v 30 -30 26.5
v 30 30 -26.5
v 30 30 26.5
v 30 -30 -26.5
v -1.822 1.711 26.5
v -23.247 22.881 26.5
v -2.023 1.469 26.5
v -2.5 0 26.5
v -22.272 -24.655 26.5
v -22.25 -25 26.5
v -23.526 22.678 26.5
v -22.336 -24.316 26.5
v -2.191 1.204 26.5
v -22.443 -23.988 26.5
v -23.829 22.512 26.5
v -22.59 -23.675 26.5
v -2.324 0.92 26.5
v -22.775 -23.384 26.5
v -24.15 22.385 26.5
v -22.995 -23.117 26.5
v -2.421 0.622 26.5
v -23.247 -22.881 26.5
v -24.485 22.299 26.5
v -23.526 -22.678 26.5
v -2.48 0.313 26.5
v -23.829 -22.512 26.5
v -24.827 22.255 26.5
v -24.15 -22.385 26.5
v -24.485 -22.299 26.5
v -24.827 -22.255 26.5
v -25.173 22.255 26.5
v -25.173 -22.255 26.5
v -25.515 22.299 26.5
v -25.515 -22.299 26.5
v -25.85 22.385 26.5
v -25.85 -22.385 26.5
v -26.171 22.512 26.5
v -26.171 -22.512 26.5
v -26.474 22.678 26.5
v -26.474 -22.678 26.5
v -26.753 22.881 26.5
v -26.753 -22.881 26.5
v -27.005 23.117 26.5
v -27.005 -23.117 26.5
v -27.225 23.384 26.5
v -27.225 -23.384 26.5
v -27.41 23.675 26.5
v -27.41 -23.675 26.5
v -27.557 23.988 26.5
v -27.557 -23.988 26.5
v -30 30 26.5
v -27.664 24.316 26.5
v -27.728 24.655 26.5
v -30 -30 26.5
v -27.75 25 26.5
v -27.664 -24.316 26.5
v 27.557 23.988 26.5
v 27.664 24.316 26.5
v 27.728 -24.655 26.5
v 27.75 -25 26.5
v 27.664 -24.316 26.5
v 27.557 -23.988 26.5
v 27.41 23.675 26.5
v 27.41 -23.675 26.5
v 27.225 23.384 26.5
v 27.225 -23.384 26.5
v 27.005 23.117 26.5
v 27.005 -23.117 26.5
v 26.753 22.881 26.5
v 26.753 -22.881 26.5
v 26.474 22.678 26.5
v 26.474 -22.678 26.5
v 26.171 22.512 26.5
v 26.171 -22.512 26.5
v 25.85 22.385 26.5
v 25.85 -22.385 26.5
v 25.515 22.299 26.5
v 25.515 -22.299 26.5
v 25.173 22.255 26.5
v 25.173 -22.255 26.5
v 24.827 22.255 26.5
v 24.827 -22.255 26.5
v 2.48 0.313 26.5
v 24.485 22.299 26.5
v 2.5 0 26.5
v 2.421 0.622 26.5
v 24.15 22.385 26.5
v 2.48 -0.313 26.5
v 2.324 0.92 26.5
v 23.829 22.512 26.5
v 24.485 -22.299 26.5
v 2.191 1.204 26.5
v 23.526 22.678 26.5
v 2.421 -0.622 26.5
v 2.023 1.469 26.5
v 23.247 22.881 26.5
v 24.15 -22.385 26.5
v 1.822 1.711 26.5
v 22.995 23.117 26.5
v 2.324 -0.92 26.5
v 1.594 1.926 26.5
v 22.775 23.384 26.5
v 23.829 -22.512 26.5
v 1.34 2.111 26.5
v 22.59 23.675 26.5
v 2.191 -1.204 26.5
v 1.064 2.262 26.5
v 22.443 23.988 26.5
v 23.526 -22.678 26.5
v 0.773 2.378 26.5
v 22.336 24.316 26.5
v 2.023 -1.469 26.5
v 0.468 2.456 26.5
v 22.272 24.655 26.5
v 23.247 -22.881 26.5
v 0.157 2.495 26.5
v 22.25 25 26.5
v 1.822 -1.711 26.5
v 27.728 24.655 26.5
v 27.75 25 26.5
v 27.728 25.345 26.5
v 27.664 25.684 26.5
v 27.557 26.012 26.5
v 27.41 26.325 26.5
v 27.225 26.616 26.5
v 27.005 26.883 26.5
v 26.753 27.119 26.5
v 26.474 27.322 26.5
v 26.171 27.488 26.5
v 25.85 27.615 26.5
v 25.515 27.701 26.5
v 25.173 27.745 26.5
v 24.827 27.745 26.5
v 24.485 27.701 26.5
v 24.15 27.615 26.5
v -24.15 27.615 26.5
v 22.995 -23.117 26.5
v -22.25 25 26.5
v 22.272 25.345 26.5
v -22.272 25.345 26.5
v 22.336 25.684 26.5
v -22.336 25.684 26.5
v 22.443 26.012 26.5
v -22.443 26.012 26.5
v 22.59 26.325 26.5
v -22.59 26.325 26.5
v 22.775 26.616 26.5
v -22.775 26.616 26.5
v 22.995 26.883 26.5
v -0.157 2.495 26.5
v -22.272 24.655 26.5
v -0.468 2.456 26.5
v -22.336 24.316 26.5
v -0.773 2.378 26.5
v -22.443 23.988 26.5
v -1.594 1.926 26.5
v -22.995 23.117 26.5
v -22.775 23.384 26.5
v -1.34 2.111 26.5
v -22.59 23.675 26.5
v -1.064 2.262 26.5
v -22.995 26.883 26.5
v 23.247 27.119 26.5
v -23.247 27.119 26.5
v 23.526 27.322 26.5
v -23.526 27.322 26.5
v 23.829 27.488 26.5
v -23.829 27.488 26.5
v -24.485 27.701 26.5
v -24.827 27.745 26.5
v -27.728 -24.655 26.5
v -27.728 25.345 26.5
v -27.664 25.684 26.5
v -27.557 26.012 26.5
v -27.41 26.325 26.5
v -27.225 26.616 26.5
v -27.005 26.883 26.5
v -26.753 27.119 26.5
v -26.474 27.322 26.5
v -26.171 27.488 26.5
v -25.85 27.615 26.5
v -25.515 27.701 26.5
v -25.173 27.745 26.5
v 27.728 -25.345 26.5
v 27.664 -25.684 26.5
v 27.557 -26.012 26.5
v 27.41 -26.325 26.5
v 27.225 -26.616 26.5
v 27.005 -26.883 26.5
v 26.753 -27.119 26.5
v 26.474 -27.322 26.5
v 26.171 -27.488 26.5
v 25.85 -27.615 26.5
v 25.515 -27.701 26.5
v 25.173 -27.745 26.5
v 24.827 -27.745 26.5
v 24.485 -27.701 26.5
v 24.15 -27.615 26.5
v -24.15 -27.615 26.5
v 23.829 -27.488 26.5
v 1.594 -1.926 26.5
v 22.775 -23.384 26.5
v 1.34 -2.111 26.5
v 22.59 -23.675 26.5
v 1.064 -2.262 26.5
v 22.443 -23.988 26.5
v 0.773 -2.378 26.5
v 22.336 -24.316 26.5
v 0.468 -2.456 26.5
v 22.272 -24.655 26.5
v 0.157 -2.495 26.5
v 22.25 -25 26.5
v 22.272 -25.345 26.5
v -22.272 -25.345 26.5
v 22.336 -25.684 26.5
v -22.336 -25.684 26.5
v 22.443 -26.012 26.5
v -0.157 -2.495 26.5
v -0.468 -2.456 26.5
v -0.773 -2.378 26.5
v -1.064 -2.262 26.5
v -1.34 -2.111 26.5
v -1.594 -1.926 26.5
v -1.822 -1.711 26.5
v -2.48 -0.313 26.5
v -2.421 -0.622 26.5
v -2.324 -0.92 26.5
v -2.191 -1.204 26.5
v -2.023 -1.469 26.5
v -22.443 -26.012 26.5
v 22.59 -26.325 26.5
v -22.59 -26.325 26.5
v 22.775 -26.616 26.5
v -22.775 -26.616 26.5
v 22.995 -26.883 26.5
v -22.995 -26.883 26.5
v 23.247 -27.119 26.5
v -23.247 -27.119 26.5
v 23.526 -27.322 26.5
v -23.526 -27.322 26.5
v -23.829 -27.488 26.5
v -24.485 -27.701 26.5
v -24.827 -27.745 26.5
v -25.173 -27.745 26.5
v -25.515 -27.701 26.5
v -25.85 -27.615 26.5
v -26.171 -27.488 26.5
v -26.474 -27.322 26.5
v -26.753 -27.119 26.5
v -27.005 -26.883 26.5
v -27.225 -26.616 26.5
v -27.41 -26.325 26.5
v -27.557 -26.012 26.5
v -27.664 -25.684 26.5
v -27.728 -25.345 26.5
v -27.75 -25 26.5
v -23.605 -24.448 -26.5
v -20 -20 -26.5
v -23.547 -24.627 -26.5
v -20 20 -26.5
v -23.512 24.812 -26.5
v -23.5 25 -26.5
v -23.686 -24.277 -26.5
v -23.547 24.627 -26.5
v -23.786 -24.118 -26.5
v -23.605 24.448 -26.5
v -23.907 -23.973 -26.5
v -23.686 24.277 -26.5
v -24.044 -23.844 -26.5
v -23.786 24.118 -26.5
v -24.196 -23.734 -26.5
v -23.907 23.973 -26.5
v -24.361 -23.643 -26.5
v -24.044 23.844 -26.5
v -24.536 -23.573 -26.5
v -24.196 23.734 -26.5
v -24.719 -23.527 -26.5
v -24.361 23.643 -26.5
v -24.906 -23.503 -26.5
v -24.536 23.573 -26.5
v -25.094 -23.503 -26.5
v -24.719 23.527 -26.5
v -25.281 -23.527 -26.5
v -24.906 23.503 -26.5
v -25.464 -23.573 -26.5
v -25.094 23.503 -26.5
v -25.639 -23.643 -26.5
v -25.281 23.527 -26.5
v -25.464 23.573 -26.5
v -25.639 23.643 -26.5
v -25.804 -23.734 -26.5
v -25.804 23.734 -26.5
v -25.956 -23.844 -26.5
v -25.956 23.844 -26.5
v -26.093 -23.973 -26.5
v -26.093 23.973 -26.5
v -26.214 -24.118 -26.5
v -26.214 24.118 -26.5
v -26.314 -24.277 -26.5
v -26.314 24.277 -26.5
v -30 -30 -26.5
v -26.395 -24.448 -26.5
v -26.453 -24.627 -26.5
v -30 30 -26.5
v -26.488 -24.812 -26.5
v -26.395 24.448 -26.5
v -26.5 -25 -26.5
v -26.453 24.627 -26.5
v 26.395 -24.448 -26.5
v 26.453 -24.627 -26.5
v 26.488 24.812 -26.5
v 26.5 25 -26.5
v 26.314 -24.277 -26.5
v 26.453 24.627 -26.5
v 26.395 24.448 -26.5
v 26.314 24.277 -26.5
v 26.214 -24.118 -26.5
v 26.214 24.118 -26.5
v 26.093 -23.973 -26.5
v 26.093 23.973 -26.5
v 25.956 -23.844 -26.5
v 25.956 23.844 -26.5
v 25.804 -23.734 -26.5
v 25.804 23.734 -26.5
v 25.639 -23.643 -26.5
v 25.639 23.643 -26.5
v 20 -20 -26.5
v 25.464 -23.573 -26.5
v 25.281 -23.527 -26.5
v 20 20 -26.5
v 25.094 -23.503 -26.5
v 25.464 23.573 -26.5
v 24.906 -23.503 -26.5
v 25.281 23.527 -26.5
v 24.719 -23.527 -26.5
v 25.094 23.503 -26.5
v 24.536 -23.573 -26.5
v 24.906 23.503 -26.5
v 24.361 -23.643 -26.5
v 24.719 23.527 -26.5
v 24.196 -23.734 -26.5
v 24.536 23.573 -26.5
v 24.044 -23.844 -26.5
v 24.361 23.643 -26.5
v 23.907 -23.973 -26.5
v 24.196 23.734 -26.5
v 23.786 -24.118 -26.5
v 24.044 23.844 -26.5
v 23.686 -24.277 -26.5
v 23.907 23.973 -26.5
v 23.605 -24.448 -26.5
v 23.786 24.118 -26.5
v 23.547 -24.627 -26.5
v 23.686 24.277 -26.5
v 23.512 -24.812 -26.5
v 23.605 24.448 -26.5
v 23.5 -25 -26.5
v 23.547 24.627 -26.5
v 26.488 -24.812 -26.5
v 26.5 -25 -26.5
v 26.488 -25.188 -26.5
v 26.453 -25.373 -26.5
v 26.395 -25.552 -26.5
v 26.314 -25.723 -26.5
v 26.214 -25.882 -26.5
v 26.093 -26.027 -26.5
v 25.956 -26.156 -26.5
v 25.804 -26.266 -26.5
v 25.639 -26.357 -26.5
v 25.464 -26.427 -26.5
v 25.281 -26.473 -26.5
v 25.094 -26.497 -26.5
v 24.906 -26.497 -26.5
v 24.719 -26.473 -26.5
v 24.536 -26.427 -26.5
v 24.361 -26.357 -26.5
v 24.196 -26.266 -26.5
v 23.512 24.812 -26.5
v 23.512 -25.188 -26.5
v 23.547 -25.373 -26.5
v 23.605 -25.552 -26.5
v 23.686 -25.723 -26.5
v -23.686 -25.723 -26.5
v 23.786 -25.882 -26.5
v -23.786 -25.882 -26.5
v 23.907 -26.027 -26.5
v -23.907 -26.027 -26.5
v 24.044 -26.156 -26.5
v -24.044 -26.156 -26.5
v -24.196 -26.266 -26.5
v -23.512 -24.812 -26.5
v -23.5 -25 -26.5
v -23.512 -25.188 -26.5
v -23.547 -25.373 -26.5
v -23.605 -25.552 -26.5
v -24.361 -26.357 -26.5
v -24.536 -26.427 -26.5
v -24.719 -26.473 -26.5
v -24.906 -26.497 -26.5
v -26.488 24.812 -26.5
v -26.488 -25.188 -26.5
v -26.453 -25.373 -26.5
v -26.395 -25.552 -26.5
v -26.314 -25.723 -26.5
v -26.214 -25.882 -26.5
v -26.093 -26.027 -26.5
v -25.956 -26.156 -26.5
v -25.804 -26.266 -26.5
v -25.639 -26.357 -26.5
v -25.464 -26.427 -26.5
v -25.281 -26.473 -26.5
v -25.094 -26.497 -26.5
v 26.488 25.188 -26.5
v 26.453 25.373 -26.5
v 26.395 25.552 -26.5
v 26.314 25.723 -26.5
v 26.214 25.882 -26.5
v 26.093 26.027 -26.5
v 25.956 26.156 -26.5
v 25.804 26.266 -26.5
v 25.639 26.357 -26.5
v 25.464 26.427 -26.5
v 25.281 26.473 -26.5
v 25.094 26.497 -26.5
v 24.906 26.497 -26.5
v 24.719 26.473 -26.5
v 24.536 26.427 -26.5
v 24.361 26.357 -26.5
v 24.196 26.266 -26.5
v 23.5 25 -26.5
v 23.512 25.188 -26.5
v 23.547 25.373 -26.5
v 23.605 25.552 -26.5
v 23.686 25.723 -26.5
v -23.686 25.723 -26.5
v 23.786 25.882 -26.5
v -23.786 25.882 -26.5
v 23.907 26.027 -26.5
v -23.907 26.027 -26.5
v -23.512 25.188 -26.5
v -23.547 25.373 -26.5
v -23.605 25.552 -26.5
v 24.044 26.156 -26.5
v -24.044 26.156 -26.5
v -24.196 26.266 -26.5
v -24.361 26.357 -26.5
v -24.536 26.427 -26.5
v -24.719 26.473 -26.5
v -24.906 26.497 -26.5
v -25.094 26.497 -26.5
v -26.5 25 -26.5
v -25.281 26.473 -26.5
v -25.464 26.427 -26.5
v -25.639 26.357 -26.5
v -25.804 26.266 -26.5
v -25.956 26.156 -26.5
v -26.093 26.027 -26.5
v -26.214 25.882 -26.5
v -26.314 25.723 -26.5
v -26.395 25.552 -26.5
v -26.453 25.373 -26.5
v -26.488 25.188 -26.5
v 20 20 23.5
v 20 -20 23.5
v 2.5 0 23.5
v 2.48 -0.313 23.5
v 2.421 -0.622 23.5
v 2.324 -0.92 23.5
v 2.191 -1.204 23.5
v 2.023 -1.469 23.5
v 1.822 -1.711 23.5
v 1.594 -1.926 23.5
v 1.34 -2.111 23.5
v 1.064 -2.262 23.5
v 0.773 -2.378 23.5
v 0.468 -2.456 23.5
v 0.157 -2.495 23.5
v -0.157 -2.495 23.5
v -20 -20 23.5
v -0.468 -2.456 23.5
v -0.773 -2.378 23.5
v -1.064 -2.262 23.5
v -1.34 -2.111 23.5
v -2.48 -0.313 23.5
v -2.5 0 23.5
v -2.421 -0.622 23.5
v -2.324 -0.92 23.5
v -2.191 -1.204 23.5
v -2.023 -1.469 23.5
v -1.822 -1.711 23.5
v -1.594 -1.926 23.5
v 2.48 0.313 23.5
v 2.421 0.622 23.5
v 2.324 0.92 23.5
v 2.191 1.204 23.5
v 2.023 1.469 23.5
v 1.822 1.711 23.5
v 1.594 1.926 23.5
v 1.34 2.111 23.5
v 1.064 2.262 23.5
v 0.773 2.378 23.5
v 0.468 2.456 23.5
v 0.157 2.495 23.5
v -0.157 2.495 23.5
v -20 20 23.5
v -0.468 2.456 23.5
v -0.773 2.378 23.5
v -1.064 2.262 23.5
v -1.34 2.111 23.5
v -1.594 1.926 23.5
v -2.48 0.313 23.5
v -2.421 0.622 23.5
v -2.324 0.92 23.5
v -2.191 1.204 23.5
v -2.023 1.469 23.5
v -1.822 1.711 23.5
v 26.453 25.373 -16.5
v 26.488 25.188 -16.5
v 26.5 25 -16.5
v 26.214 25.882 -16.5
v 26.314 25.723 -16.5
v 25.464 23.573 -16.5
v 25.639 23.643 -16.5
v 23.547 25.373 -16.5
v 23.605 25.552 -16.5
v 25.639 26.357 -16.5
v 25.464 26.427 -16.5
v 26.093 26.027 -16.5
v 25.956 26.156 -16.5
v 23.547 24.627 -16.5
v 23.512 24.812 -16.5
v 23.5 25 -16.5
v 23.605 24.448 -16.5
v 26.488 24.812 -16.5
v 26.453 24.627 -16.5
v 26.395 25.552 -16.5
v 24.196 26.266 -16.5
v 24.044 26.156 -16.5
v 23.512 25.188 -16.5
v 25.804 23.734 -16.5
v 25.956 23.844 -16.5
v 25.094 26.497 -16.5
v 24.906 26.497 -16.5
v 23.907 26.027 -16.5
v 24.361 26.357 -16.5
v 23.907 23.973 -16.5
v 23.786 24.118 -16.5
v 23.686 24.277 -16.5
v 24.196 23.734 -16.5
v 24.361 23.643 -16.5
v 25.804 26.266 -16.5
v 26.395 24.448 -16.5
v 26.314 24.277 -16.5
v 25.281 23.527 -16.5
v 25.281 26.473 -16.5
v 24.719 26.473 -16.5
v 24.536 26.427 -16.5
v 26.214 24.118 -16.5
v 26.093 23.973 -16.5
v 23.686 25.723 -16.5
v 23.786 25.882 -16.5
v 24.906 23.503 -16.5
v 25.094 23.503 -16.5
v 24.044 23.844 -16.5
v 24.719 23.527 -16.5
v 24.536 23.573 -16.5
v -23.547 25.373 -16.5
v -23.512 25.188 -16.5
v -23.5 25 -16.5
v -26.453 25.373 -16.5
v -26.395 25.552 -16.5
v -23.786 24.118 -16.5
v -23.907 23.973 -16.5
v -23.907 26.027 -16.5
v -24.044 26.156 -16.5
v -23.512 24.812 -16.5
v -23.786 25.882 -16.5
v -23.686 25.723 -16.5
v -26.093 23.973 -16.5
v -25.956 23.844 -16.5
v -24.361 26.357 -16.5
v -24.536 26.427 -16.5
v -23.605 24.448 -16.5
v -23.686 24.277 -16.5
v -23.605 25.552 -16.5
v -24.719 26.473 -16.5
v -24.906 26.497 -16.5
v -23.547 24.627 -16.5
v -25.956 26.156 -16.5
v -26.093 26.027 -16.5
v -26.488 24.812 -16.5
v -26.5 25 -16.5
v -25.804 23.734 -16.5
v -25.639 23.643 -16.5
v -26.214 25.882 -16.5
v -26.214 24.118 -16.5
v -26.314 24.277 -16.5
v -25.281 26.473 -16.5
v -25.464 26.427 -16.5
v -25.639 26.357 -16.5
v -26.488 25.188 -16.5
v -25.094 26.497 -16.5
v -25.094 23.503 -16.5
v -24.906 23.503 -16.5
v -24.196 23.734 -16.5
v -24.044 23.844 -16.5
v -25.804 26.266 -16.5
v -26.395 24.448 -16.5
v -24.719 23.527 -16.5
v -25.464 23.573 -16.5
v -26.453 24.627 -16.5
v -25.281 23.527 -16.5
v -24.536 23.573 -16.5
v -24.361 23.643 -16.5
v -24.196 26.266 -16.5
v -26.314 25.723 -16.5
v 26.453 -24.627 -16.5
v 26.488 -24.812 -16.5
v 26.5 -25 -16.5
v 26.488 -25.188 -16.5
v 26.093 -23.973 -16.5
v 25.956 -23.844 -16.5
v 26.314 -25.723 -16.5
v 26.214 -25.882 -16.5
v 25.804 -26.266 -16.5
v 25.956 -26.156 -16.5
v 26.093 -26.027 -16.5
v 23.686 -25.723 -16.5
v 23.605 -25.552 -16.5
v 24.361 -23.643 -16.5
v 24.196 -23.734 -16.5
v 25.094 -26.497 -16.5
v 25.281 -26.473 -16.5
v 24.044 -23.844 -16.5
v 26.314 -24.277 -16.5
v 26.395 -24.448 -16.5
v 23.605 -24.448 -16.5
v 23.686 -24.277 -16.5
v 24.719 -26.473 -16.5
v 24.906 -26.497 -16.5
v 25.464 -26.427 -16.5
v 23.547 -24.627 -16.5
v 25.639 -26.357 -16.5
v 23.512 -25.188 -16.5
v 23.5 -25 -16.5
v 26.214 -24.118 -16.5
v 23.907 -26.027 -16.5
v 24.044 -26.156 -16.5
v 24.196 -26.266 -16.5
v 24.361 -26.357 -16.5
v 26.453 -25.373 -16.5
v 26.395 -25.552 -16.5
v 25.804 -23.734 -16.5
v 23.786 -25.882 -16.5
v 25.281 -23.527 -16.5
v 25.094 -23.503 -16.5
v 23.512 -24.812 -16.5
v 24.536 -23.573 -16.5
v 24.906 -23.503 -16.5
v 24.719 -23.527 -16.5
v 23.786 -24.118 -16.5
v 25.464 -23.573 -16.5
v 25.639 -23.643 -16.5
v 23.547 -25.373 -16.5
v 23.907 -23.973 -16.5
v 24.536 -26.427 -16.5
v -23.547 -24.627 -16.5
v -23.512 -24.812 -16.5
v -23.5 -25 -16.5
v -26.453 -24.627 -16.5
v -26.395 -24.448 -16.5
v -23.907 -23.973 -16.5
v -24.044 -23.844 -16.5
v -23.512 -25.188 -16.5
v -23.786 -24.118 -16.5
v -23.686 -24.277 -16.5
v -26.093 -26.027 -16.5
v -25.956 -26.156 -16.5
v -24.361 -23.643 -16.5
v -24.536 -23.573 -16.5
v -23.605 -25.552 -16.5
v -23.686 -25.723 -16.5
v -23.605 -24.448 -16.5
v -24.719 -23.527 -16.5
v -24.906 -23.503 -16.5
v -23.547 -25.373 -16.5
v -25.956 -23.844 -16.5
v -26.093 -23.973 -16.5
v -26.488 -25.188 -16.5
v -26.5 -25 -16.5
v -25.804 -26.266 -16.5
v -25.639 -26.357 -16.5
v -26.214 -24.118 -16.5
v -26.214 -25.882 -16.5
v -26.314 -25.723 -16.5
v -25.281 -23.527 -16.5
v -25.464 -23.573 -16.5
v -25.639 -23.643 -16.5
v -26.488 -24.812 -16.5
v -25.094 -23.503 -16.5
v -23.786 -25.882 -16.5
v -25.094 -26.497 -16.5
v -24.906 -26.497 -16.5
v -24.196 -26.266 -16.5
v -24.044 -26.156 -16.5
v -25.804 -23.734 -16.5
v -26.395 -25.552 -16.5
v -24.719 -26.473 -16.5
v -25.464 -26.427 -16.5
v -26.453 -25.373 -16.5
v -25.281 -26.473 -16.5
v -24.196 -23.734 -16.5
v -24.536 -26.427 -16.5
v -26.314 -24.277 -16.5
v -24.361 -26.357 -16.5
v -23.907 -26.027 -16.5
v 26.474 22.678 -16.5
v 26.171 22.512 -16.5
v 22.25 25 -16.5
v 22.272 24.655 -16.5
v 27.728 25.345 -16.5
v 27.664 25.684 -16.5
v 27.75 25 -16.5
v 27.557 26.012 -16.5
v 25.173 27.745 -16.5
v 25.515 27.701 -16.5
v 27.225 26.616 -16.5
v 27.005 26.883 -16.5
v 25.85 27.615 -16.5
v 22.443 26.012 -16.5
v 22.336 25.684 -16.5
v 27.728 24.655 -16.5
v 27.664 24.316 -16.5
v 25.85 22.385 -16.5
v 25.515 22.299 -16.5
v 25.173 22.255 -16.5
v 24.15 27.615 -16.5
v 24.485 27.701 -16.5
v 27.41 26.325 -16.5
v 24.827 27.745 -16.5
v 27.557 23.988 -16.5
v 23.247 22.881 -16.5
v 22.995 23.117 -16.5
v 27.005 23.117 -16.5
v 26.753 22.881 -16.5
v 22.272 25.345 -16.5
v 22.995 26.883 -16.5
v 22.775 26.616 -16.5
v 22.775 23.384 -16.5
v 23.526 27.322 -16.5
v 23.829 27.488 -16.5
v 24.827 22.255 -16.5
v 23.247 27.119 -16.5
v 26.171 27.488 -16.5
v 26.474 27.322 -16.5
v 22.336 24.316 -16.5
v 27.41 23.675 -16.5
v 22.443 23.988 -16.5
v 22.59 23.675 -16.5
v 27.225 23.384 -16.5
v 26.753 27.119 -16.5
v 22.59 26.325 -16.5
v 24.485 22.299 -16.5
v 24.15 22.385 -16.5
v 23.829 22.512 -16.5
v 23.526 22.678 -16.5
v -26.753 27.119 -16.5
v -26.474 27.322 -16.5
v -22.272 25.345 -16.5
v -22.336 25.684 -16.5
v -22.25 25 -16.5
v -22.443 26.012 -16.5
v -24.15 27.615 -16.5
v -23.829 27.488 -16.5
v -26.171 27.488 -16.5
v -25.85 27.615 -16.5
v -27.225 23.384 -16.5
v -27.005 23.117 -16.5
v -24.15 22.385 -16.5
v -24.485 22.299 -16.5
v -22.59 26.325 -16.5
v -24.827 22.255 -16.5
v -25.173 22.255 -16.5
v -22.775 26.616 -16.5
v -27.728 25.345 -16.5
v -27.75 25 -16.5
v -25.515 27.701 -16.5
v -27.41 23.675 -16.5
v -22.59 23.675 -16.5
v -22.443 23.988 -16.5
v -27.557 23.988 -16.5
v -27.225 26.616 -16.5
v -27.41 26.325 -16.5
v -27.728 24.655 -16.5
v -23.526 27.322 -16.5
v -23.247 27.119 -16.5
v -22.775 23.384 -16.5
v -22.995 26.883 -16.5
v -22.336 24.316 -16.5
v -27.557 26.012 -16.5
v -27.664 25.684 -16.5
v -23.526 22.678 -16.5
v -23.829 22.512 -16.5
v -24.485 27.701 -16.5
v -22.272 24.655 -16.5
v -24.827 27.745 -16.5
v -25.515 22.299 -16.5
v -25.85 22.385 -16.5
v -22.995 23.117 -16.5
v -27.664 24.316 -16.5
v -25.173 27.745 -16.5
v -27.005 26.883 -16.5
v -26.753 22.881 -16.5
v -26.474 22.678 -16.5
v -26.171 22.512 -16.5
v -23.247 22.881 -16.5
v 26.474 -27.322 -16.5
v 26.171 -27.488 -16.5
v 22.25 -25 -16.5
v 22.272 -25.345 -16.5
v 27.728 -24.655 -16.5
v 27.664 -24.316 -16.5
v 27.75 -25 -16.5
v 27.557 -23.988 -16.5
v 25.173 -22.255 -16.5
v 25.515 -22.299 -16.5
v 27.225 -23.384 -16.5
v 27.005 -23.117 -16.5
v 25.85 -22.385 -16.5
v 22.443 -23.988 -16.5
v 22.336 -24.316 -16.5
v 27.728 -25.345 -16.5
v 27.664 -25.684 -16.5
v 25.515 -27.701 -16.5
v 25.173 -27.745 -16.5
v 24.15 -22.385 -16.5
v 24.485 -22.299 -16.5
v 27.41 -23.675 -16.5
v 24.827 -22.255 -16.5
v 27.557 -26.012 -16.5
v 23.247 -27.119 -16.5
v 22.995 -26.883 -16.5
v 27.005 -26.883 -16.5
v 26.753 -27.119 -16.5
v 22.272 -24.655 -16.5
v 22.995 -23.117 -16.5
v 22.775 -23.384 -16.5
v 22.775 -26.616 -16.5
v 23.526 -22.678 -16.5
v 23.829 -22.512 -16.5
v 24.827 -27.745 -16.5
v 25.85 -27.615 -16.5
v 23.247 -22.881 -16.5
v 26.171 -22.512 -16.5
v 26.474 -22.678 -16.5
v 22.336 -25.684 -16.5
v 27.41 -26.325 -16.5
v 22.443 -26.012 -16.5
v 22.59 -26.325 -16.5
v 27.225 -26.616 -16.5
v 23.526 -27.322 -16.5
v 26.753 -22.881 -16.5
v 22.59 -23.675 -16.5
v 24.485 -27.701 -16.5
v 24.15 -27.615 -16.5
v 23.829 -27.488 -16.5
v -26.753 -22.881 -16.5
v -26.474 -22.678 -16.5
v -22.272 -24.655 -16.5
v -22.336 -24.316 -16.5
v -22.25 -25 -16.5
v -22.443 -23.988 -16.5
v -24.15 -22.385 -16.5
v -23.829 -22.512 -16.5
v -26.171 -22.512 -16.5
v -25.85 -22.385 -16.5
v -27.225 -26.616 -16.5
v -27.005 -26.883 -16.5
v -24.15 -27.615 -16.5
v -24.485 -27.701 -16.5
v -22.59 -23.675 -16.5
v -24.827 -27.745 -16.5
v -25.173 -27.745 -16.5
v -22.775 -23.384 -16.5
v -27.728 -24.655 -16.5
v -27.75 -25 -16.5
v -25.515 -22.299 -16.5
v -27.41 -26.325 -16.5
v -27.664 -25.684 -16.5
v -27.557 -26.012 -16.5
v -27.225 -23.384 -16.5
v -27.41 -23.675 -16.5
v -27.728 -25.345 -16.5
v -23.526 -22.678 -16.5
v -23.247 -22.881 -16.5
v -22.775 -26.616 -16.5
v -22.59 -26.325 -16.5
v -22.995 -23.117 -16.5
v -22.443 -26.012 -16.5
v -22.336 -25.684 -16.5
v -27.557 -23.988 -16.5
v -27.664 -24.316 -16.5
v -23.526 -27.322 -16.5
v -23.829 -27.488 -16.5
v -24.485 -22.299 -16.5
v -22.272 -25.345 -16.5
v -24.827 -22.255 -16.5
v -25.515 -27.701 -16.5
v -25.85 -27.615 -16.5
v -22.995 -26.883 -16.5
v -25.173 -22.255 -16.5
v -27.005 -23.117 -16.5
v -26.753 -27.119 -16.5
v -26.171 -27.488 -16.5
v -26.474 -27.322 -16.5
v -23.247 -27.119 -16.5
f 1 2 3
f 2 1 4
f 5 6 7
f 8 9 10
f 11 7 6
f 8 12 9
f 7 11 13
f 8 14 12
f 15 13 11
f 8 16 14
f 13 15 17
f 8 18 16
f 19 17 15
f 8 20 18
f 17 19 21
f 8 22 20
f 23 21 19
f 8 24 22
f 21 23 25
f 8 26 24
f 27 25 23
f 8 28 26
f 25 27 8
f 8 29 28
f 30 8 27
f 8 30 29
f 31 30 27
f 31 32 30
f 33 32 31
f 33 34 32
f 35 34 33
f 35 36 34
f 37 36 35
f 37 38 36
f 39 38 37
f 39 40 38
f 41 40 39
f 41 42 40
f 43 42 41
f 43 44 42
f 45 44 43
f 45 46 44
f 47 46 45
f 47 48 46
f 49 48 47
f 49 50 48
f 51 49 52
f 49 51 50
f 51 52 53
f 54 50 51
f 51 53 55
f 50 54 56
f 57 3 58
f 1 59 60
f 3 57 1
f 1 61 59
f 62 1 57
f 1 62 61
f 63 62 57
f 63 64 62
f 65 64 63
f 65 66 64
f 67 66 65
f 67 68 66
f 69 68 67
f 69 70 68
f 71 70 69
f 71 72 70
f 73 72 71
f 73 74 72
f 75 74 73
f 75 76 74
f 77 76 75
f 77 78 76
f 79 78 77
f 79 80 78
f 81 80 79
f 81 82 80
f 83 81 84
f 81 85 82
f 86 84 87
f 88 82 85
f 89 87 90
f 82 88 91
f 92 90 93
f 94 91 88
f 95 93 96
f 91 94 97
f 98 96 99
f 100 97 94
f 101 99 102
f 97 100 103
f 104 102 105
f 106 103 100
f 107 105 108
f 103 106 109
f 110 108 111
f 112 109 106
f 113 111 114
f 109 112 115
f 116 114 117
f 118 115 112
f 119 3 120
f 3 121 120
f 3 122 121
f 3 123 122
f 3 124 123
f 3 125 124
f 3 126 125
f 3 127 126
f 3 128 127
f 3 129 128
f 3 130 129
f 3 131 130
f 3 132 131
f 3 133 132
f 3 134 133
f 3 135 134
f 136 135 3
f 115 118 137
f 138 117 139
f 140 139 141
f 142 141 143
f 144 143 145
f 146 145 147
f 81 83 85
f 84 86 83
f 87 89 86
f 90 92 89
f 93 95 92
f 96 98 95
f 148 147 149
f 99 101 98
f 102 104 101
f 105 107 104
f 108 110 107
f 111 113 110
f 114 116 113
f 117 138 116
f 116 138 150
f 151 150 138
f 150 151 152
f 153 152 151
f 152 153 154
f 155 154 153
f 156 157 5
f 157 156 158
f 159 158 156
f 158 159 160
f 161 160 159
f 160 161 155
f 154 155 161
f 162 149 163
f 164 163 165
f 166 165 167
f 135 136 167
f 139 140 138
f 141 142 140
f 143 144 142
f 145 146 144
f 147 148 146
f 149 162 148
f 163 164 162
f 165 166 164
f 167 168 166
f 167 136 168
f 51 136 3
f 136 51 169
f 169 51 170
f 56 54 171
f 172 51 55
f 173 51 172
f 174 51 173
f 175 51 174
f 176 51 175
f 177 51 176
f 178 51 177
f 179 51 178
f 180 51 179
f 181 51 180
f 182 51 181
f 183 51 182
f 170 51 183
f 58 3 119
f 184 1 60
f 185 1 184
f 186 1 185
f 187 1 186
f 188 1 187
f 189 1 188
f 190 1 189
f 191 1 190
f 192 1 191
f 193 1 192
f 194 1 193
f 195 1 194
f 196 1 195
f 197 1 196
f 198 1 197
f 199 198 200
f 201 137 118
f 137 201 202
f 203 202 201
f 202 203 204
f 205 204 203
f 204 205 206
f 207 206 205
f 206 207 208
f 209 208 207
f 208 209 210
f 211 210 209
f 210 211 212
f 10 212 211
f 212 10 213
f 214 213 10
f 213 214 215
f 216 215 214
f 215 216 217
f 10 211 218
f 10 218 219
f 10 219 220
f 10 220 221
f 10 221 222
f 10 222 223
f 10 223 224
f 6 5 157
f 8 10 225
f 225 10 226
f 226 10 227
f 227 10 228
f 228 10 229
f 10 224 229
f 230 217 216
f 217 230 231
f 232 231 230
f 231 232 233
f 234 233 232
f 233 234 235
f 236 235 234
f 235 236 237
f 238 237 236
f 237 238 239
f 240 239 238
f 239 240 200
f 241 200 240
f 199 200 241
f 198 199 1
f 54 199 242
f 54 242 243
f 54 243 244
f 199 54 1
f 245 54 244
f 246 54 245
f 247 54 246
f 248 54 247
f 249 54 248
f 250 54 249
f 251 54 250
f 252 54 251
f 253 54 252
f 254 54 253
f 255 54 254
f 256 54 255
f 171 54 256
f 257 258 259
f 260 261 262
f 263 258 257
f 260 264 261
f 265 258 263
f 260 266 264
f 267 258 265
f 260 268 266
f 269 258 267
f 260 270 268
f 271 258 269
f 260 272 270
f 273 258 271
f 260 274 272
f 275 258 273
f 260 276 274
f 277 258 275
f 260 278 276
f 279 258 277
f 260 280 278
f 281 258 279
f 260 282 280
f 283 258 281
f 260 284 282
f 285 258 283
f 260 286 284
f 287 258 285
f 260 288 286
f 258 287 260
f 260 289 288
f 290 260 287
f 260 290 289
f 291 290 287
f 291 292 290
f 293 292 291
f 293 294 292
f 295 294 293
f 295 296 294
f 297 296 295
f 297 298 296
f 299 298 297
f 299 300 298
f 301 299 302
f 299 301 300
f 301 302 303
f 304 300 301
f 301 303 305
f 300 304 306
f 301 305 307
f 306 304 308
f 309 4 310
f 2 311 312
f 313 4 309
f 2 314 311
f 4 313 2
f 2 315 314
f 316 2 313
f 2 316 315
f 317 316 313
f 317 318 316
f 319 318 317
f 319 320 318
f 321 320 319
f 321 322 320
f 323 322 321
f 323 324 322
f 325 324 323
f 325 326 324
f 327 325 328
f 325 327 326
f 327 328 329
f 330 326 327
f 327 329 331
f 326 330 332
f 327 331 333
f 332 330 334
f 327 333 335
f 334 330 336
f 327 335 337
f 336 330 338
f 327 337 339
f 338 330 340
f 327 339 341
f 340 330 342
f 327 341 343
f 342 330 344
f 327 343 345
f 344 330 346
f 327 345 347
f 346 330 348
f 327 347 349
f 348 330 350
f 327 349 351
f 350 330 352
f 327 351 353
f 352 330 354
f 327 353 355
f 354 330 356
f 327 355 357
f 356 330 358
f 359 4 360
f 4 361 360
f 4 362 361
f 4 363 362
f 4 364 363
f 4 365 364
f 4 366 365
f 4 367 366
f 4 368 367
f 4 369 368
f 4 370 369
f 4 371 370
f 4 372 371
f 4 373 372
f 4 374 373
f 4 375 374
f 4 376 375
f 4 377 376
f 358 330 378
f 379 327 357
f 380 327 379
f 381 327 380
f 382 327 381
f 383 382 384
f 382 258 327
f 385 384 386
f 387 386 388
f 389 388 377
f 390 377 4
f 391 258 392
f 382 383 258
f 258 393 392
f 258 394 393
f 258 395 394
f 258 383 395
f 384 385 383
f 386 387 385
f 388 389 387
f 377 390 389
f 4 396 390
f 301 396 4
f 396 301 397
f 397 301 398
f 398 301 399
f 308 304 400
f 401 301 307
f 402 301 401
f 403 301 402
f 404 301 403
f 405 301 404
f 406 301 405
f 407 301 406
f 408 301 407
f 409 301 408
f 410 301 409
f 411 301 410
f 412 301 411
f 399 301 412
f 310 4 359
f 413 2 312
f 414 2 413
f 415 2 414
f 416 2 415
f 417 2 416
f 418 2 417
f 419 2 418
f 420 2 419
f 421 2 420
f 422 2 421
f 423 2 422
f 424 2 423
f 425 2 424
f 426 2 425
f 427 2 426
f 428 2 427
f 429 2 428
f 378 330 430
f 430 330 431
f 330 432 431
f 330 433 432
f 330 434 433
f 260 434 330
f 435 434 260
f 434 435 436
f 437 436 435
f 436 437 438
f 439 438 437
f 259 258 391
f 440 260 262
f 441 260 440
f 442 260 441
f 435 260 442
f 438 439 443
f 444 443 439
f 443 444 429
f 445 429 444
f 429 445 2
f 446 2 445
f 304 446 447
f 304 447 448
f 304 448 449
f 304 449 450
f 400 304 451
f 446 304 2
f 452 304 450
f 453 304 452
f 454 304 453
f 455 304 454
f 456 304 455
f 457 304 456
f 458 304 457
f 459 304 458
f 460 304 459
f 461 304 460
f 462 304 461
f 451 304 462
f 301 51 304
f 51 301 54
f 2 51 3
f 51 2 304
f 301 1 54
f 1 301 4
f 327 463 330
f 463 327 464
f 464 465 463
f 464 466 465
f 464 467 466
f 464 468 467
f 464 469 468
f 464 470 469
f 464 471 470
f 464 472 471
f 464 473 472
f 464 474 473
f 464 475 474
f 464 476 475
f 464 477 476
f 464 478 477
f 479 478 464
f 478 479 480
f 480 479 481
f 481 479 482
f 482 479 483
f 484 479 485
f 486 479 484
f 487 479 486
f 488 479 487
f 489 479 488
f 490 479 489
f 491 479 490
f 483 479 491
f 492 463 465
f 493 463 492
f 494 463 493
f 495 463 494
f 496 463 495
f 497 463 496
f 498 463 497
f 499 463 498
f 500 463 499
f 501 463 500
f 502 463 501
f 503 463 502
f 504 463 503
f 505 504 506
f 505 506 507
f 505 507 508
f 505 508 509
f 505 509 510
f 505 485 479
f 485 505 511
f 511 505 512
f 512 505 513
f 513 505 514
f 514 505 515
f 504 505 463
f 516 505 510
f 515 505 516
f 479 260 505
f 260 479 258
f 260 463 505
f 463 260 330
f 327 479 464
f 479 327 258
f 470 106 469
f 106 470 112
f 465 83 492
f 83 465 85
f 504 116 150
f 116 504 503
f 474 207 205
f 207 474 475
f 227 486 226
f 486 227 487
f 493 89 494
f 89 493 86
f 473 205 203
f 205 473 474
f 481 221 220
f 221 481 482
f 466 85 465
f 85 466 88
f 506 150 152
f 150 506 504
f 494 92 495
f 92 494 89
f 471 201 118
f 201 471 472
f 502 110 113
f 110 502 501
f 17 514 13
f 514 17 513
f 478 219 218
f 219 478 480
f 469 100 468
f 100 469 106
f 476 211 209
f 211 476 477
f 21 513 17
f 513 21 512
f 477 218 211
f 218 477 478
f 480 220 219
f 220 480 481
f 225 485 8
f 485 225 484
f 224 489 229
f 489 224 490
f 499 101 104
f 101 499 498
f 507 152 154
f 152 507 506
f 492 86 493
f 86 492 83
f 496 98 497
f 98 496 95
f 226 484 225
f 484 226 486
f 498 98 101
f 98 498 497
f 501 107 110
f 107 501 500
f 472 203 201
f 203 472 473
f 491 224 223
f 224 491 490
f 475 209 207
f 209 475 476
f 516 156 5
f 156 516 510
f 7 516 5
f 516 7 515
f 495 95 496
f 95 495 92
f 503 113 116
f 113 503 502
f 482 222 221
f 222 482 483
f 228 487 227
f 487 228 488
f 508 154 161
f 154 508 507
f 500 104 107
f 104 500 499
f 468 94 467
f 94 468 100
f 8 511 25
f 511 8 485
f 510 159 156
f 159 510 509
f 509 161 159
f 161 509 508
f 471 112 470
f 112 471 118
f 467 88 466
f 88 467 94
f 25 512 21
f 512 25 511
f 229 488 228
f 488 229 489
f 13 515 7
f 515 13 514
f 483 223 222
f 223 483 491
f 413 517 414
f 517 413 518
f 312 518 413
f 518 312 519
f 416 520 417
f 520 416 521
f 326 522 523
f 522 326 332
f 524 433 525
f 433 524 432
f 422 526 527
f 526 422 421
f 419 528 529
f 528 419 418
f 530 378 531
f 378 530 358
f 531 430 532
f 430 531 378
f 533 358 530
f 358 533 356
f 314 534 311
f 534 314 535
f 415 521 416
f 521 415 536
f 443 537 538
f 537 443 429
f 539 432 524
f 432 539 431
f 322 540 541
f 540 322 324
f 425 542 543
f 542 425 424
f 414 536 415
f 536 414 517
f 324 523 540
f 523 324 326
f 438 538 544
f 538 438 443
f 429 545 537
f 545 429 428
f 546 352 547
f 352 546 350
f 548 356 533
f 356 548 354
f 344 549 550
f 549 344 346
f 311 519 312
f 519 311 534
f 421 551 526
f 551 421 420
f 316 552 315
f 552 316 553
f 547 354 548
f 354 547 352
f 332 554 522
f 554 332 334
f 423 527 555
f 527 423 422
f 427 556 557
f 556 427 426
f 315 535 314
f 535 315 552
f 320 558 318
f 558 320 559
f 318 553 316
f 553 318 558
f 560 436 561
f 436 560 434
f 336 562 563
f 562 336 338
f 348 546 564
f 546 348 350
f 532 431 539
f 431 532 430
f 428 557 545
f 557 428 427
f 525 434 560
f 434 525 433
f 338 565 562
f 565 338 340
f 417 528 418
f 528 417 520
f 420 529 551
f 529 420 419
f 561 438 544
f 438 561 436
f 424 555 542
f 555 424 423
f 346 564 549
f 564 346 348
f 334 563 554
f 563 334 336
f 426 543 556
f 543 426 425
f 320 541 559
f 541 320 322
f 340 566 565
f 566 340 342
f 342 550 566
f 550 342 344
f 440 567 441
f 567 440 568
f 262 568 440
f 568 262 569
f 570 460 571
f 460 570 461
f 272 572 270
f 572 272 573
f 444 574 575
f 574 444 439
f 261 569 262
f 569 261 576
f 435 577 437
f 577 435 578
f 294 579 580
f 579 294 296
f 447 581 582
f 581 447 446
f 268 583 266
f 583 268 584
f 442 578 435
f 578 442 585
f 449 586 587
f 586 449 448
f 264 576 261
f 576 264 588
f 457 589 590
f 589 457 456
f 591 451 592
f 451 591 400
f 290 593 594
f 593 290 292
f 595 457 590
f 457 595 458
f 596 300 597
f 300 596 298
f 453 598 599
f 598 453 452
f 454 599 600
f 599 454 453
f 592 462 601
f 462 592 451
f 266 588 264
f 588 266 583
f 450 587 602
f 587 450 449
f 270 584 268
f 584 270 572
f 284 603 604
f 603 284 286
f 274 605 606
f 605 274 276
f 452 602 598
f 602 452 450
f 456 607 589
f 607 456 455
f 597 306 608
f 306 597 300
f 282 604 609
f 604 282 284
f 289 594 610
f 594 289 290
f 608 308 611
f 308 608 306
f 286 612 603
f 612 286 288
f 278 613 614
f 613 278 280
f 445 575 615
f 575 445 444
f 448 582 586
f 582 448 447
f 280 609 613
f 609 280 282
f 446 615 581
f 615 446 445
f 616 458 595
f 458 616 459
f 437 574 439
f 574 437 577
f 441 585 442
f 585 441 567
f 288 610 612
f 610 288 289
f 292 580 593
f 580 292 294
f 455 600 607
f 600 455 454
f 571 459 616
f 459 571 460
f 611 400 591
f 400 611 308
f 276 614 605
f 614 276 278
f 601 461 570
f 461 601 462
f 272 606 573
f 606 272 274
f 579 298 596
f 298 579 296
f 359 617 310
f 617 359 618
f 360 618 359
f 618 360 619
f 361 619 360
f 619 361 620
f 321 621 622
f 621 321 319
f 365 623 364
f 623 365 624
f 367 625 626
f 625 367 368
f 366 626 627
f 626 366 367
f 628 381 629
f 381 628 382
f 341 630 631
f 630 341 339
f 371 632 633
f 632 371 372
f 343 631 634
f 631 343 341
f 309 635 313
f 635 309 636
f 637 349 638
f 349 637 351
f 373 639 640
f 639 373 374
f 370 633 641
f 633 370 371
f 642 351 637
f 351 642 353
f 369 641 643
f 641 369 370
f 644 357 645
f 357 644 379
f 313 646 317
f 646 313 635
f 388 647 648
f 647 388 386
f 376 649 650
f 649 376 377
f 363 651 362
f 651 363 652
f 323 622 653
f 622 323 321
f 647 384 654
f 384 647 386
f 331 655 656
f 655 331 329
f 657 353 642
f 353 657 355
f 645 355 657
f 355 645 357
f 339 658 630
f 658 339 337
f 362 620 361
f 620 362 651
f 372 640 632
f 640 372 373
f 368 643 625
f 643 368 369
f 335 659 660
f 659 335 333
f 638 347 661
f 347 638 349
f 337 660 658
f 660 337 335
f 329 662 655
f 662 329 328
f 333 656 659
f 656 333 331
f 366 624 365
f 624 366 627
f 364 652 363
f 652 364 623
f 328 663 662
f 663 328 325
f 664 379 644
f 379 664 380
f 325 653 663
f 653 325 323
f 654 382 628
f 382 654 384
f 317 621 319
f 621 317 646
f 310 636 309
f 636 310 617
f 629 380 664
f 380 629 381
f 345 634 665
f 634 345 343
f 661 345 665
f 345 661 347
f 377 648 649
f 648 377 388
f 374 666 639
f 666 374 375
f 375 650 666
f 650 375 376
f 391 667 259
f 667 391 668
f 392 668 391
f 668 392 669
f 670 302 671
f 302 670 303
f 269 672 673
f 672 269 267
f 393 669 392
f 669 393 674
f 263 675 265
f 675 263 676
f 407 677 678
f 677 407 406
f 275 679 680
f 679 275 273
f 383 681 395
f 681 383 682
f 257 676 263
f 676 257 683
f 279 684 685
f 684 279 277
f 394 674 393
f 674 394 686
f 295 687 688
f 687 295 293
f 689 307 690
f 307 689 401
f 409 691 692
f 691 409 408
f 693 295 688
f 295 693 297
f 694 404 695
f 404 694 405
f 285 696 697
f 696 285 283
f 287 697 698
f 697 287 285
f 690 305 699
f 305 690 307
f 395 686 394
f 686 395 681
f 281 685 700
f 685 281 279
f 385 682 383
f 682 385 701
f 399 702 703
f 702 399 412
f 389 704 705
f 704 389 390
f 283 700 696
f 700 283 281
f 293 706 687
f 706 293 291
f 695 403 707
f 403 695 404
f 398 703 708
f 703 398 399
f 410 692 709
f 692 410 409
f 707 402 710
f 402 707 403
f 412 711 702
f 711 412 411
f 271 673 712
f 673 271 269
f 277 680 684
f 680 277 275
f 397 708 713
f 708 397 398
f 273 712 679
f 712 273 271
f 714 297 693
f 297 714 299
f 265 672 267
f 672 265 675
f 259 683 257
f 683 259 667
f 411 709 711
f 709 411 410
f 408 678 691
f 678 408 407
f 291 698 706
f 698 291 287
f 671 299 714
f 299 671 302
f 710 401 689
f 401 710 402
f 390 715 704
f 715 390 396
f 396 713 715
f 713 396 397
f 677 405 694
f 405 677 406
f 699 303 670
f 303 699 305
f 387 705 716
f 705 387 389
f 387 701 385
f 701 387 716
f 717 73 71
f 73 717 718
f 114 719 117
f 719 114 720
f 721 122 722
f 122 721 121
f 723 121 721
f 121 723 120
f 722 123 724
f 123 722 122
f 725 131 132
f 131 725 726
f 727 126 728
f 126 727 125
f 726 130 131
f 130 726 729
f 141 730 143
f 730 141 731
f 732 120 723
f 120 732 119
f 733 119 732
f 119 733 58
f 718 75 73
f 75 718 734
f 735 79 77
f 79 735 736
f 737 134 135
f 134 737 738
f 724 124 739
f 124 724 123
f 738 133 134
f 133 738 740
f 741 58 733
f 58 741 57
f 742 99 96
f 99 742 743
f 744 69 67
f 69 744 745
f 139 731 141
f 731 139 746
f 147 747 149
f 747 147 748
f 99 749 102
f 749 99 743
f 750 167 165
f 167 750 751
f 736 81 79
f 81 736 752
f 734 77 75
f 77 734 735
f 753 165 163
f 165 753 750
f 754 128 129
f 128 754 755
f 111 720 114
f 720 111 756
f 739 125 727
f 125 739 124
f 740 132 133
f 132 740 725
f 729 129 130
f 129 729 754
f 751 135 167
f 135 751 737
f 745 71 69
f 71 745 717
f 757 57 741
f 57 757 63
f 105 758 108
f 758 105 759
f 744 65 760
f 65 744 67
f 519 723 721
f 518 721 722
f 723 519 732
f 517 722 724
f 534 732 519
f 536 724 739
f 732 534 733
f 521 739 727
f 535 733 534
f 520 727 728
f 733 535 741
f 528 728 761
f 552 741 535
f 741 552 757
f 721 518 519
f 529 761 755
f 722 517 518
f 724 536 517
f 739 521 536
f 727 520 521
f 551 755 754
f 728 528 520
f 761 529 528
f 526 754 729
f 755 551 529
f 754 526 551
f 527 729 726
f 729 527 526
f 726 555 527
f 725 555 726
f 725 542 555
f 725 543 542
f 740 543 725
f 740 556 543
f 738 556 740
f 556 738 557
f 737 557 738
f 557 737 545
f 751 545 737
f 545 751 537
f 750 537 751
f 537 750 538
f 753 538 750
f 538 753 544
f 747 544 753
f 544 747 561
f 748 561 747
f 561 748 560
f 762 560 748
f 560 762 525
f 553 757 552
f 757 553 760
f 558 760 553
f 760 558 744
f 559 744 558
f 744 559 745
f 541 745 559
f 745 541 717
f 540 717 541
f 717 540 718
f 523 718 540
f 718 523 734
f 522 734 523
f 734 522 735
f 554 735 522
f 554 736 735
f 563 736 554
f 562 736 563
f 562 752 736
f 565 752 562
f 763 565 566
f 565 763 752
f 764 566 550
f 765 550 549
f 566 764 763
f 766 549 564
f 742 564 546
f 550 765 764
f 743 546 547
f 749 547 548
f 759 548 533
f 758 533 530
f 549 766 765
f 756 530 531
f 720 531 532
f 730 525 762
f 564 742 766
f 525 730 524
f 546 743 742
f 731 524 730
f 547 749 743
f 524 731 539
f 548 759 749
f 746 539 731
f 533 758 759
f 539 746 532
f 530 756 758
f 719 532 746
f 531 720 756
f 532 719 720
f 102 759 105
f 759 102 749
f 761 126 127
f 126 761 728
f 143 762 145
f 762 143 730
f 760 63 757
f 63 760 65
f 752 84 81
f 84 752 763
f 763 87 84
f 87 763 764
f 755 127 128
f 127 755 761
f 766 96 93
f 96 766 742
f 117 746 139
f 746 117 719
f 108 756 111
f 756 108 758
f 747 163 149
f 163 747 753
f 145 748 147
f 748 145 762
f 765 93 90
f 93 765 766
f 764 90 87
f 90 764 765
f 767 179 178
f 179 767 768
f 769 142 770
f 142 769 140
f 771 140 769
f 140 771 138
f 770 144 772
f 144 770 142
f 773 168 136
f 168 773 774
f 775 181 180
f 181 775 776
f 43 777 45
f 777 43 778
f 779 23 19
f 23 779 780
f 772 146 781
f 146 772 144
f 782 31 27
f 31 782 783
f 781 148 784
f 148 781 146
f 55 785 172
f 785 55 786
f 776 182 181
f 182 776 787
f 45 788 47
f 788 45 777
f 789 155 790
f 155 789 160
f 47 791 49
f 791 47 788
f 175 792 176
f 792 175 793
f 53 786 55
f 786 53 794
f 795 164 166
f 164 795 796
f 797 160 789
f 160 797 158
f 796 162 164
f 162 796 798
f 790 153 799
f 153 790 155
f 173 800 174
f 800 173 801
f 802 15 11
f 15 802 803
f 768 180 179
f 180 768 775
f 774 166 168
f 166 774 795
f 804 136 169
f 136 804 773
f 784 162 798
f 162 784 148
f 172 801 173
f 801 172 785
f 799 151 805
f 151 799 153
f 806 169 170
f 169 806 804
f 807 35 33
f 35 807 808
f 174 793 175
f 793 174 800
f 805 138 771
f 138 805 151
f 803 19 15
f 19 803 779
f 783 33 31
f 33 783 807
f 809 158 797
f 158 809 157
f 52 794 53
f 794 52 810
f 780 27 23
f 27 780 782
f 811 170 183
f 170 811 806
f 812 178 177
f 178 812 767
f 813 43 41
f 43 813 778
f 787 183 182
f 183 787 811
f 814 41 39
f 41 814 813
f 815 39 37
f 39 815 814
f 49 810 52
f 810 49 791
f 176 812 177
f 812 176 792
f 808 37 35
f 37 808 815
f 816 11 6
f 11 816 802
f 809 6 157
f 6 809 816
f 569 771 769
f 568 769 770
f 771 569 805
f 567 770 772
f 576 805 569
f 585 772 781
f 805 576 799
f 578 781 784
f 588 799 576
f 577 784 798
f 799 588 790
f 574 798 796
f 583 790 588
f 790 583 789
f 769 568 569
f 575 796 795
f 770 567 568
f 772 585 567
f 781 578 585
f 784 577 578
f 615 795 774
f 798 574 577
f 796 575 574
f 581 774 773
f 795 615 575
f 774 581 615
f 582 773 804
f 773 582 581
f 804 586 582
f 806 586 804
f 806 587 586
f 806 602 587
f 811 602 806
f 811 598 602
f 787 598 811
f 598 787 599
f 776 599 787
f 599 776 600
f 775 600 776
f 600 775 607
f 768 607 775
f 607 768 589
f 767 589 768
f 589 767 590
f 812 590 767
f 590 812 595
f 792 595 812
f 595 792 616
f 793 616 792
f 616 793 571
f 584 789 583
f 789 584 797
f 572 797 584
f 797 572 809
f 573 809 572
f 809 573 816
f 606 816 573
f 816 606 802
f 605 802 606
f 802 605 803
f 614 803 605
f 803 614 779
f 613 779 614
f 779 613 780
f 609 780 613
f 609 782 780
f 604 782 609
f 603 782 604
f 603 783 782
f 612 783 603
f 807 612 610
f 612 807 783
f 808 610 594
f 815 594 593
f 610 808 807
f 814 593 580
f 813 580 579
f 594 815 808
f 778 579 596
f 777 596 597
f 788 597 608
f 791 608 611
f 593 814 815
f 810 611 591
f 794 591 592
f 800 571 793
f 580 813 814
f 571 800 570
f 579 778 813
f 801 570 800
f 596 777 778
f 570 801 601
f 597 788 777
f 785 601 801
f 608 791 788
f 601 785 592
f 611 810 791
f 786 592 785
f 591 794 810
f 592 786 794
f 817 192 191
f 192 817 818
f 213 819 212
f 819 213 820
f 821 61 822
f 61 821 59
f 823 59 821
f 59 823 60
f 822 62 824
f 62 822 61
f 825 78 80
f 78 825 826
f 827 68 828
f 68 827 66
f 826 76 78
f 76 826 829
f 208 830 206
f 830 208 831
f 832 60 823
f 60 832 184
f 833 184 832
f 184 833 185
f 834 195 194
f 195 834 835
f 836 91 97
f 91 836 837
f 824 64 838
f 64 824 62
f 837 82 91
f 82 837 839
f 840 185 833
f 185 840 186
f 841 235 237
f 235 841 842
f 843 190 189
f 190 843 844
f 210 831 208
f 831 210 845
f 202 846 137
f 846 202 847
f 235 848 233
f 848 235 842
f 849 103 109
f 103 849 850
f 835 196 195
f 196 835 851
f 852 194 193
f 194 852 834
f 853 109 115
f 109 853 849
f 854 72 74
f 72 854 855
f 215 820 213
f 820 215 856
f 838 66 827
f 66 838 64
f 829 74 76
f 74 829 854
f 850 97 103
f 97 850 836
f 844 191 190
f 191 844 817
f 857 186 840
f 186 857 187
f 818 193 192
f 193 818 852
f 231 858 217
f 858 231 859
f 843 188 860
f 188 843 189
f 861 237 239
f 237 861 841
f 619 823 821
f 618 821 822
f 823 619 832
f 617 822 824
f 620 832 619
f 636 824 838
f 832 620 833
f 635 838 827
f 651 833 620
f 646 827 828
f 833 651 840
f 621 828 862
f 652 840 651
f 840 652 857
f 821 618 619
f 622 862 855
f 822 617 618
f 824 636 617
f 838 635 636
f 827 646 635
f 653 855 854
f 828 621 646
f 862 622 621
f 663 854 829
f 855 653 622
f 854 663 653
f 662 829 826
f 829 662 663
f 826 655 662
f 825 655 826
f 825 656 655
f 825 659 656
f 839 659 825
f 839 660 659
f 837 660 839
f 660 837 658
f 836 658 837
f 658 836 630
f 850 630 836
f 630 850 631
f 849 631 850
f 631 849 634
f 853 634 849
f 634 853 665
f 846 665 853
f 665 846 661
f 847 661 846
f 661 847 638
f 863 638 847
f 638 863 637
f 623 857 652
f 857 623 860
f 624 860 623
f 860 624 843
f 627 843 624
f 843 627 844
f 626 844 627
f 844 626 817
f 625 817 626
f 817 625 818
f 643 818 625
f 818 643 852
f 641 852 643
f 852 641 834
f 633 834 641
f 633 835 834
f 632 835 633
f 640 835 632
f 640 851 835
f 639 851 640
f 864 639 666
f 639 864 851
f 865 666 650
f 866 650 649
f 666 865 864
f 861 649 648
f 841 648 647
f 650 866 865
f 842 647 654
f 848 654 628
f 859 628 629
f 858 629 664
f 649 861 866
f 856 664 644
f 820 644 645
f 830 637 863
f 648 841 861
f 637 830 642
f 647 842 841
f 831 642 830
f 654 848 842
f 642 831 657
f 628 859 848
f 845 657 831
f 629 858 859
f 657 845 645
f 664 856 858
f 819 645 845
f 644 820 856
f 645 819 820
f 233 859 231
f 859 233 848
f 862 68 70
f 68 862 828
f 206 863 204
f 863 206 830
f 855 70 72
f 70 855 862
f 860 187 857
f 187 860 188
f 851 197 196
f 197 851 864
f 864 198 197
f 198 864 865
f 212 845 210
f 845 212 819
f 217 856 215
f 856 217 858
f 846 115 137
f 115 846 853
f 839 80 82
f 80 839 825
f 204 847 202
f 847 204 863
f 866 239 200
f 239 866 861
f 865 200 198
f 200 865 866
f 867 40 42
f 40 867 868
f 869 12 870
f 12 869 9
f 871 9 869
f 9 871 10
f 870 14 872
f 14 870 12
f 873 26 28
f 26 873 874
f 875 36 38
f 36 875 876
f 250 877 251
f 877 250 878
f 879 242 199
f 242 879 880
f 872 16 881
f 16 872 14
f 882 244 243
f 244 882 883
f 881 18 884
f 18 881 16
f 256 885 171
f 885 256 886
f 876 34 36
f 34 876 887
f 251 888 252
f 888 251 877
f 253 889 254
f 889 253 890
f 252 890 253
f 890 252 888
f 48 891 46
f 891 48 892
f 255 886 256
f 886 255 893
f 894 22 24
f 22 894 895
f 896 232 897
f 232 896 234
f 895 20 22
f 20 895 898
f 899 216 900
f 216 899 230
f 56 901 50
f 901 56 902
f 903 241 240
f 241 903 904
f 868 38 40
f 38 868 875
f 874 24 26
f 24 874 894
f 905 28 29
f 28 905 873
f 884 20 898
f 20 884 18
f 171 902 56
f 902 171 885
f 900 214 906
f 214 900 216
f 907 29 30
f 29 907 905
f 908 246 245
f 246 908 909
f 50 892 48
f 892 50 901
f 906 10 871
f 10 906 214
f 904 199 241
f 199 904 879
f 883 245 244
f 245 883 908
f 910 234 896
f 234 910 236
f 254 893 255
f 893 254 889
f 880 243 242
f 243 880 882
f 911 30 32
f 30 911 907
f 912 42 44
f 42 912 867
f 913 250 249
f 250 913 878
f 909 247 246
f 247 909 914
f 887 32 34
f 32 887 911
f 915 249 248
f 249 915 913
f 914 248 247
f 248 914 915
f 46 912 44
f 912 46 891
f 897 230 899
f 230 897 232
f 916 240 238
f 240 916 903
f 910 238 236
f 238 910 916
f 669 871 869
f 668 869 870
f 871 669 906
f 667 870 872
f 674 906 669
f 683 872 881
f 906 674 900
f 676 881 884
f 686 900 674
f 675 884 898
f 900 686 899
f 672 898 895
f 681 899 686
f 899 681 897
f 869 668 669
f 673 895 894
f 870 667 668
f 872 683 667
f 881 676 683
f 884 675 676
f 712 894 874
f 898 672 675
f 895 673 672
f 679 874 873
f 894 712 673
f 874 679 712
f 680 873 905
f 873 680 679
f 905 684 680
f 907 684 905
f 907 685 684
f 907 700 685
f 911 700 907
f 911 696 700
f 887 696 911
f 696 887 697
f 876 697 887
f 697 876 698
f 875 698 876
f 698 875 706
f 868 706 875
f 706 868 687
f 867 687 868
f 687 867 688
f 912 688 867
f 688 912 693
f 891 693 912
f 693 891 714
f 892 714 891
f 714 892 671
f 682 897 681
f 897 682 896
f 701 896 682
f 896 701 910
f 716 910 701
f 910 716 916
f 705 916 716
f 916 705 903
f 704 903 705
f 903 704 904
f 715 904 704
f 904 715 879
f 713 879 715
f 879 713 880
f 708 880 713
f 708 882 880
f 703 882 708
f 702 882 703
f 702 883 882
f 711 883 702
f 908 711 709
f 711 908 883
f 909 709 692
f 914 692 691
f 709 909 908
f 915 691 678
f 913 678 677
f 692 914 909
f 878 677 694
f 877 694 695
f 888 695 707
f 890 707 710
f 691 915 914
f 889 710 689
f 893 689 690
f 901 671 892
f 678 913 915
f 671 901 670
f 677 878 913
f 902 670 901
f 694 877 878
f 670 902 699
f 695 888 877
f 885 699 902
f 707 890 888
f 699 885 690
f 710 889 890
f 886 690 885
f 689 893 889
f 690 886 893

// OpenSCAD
Height=50; //
X=40; //
Y=40; //
Borediameter=5;
Nutdiameter=3;
Nutscrewdiameter=5.5;
difference() {
        
    cube([60,60,Height+3],center=true);
    translate([0,0,-3])
    cube([X,Y,Height+3],center=true);
    translate([0,0,0])
    cylinder(h=(Height+3)/2,r1=Borediameter/2,r2=Borediameter/2,$fn=50);
    translate([(((60-X)/4)+(X/2)),(((60-Y)/4)+(Y/2)),-((Height+3)/2)])
    cylinder(h=Height+3,r1=Nutdiameter/2,r2=Nutdiameter/2,$fn=50);
    translate([-(((60-X)/4)+(X/2)),(((60-Y)/4)+(Y/2)),-((Height+3)/2)])
    cylinder(h=Height+3,r1=Nutdiameter/2,r2=Nutdiameter/2,$fn=50);
    translate([(((60-X)/4)+(X/2)),-(((60-Y)/4)+(Y/2)),-((Height+3)/2)])
    cylinder(h=Height+3,r1=Nutdiameter/2,r2=Nutdiameter/2,$fn=50);
    translate([-(((60-X)/4)+(X/2)),-(((60-Y)/4)+(Y/2)),-((Height+3)/2)])
    cylinder(h=Height+3,r1=Nutdiameter/2,r2=Nutdiameter/2,$fn=50);
    translate([(((60-X)/4)+(X/2)),(((60-Y)/4)+(Y/2)),-((Height+3)/2)+10])
    cylinder(h=Height+3,r1=Nutscrewdiameter/2,r2=Nutscrewdiameter/2,$fn=50);
    translate([-(((60-X)/4)+(X/2)),(((60-Y)/4)+(Y/2)),-((Height+3)/2)+10])
    cylinder(h=Height+3,r1=Nutscrewdiameter/2,r2=Nutscrewdiameter/2,$fn=50);
    translate([(((60-X)/4)+(X/2)),-(((60-Y)/4)+(Y/2)),-((Height+3)/2)+10])
    cylinder(h=Height+3,r1=Nutscrewdiameter/2,r2=Nutscrewdiameter/2,$fn=50);
    translate([-(((60-X)/4)+(X/2)),-(((60-Y)/4)+(Y/2)),-((Height+3)/2)+10])
    cylinder(h=Height+3,r1=Nutscrewdiameter/2,r2=Nutscrewdiameter/2,$fn=50);
}
